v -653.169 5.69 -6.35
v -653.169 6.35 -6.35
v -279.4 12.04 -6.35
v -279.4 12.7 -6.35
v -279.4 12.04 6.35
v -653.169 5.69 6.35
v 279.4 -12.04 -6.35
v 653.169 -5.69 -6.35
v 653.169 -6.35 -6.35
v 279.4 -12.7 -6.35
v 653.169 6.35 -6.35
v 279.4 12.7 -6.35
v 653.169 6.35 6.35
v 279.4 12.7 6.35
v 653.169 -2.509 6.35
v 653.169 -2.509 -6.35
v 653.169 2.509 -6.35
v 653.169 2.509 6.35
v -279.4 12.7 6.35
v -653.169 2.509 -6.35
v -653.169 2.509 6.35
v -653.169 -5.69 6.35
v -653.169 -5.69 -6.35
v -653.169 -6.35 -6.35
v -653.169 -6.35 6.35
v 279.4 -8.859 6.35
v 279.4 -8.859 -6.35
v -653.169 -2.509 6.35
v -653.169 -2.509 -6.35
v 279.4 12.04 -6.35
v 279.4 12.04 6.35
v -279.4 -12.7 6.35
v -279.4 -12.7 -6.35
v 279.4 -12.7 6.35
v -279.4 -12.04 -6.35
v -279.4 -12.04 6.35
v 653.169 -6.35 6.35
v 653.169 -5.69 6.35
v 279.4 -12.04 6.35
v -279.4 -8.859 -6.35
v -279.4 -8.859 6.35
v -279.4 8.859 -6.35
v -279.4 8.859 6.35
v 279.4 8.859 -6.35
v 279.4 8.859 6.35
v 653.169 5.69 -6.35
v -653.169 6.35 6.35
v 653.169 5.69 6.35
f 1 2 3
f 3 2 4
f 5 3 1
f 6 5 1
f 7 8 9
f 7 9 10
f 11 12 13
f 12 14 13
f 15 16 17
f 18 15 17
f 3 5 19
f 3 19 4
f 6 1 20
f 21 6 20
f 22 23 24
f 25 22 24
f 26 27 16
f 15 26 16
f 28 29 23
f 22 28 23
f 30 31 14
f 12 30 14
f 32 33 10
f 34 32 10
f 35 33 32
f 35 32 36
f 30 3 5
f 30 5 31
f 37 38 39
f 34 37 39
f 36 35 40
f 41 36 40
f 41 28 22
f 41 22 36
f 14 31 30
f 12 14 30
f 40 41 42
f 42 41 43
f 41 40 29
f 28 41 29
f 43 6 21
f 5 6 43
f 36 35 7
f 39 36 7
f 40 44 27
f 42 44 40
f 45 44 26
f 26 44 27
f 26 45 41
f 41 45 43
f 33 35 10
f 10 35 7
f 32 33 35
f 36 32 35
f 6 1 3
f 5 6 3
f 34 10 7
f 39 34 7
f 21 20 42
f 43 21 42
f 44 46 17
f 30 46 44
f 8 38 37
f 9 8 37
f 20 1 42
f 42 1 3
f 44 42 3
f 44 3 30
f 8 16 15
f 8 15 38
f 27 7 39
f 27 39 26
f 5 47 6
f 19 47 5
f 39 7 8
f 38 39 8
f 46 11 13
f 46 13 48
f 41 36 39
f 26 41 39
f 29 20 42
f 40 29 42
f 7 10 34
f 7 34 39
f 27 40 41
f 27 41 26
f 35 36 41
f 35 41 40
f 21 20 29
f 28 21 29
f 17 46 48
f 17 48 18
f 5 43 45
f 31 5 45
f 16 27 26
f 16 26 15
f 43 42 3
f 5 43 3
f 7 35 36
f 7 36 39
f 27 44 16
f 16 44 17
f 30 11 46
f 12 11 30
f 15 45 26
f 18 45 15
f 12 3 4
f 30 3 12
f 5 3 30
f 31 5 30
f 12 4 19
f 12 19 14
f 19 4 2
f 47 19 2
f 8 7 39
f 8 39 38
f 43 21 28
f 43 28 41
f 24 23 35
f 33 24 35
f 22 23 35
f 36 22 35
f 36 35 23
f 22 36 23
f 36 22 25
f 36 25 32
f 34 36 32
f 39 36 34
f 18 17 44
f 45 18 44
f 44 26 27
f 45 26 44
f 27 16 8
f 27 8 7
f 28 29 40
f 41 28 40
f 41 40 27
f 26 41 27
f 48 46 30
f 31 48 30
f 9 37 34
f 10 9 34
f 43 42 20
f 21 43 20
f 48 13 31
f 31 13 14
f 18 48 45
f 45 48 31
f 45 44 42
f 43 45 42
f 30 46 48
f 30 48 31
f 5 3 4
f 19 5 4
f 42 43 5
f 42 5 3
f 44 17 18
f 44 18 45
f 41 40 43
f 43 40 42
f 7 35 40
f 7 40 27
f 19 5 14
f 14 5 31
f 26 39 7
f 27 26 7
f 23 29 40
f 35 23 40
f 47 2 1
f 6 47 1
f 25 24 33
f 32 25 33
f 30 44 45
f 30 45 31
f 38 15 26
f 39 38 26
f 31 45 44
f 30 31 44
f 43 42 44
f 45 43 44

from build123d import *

# Parameters (mm, degrees)
BOSS_EXTRUDE1_DEPTH      = 6.35
SPLIT1_SURFACE_1_1_BACK  = 1307.646
SPLIT1_SURFACE_1_1_DEPTH = 2615.292
SPLIT1_SURFACE_1_2_BACK  = 1307.646
SPLIT1_SURFACE_1_2_DEPTH = 2615.292
SPLIT1_SURFACE_2_3_BACK  = 1307.646
SPLIT1_SURFACE_2_3_DEPTH = 2615.292
SPLIT1_SURFACE_2_4_BACK  = 1307.646
SPLIT1_SURFACE_2_4_DEPTH = 2615.292
SPLIT1_SURFACE_4_5_BACK  = 1307.646
SPLIT1_SURFACE_4_5_DEPTH = 2615.292
SPLIT1_SURFACE_4_6_BACK  = 1307.646
SPLIT1_SURFACE_4_6_DEPTH = 2615.292
SPLIT1_SURFACE_5_7_BACK  = 1307.646
SPLIT1_SURFACE_5_7_DEPTH = 2615.292
SPLIT1_SURFACE_5_8_BACK  = 1307.646
SPLIT1_SURFACE_5_8_DEPTH = 2615.292
SPLIT2_START             = -653.16862
SPLIT2_OUTLINE_W         = 8.7
SPLIT2_OUTLINE_H         = 12.7
SPLIT2_DEPTH             = 932.56862
SPLIT2_START_2           = -6.35
SPLIT2_2_DEPTH           = 12.7
SPLIT2_START_3           = 12.039904759
SPLIT2_3_OUTLINE_W       = 558.8
SPLIT2_3_OUTLINE_H       = 12.7
SPLIT2_3_DEPTH           = 0.660095241
SPLIT2_4_OUTLINE_W       = 11.039904759
SPLIT2_4_OUTLINE_H       = 12.7
SPLIT2_4_DEPTH           = 932.56862
SPLIT2_5_DEPTH           = 12.7
SPLIT2_START_4           = 8.85944587
SPLIT2_6_OUTLINE_W       = 558.8
SPLIT2_6_OUTLINE_H       = 12.7
SPLIT2_6_DEPTH           = 3.180458889
SPLIT2_7_DEPTH           = 12.7
SPLIT2_8_DEPTH           = 12.7
SPLIT2_9_OUTLINE_W       = 20
SPLIT2_9_OUTLINE_H       = 12.7
SPLIT2_9_DEPTH           = 373.76862
SPLIT2_START_5           = 279.4
SPLIT2_10_OUTLINE_W      = 20
SPLIT2_10_OUTLINE_H      = 12.7
SPLIT2_10_DEPTH          = 373.76862
SPLIT2_11_OUTLINE_W      = 11.039904759
SPLIT2_11_OUTLINE_H      = 12.7
SPLIT2_11_DEPTH          = 932.56862
SPLIT2_12_DEPTH          = 12.7
SPLIT2_START_6           = -12.039904759
SPLIT2_13_OUTLINE_W      = 558.8
SPLIT2_13_OUTLINE_H      = 12.7
SPLIT2_13_DEPTH          = 3.180458889
SPLIT2_14_OUTLINE_W      = 8.7
SPLIT2_14_OUTLINE_H      = 12.7
SPLIT2_14_DEPTH          = 932.56862
SPLIT2_15_DEPTH          = 12.7
SPLIT2_16_OUTLINE_W      = 558.8
SPLIT2_16_OUTLINE_H      = 0.660095241
SPLIT2_16_DEPTH          = 12.7


# Read off the part's stored shape, not the designer's step: Split2
with BuildPart() as part:
    # Sketch1 → Boss-Extrude1 (new, symmetric)
    with BuildSketch(Plane.XY):
        Polygon((-653.16862, 6.35), (-653.16862, -6.35), (-279.4, -12.7), (0, -12.7), (0, 12.7), (-279.4, 12.7), align=None)
    boss_extrude1 = extrude(amount=BOSS_EXTRUDE1_DEPTH, both=True)

    # Mirror1: Boss-Extrude1 across Right Plane
    add(boss_extrude1.mirror(Plane(origin=(0, 0, 0), x_dir=(0, 0, -1), z_dir=(1, 0, 0))))


with BuildPart() as body_2:
    # Split1: the piece behind the surface
    add(part.part)
    # Split1 surface 1: a surface, the sketch's curves swept straight by 2615.292 mm
    with BuildLine(Plane.XY.offset(6.35).offset(-SPLIT1_SURFACE_1_1_BACK), mode=Mode.PRIVATE) as split1_surface_1_1_path:
        Line((653.16862, 5.689904759), (279.4, 12.039904759))
        Line((279.4, 12.039904759), (-279.4, 12.039904759))
        Line((-279.4, 12.039904759), (-653.16862, 5.689904759))
    split1_surface_1_1 = Shell.extrude(split1_surface_1_1_path.wire(), (0 * SPLIT1_SURFACE_1_1_DEPTH, 0 * SPLIT1_SURFACE_1_1_DEPTH, 1 * SPLIT1_SURFACE_1_1_DEPTH))
    split(bisect_by=split1_surface_1_1, keep=Keep.BOTTOM)

    # Split2 outline → Split2 (cut)
    with BuildSketch(Plane.YZ.offset(SPLIT2_START)):
        with Locations((8.35, 0)):
            Rectangle(SPLIT2_OUTLINE_W, SPLIT2_OUTLINE_H)
    extrude(amount=SPLIT2_DEPTH, mode=Mode.SUBTRACT)


with BuildPart() as part_1:
    add(part.part)

    # Split1: split by a surface, the side it looks to stays
    # Split1 surface 1: a surface, the sketch's curves swept straight by 2615.292 mm
    with BuildLine(Plane.XY.offset(6.35).offset(-SPLIT1_SURFACE_1_2_BACK), mode=Mode.PRIVATE) as split1_surface_1_2_path:
        Line((653.16862, 5.689904759), (279.4, 12.039904759))
        Line((279.4, 12.039904759), (-279.4, 12.039904759))
        Line((-279.4, 12.039904759), (-653.16862, 5.689904759))
    split1_surface_1_2 = Shell.extrude(split1_surface_1_2_path.wire(), (0 * SPLIT1_SURFACE_1_2_DEPTH, 0 * SPLIT1_SURFACE_1_2_DEPTH, 1 * SPLIT1_SURFACE_1_2_DEPTH))
    split(bisect_by=split1_surface_1_2, keep=Keep.TOP)


with BuildPart() as body_3:
    # Split1 2: the piece behind the surface
    add(part_1.part)
    # Split1 surface 2: a surface, the sketch's curves swept straight by 2615.292 mm
    with BuildLine(Plane.XY.offset(6.35).offset(-SPLIT1_SURFACE_2_3_BACK), mode=Mode.PRIVATE) as split1_surface_2_3_path:
        Line((653.16862, 2.50944587), (279.4, 8.85944587))
        Line((279.4, 8.85944587), (-279.4, 8.85944587))
        Line((-279.4, 8.85944587), (-653.16862, 2.50944587))
    split1_surface_2_3 = Shell.extrude(split1_surface_2_3_path.wire(), (0 * SPLIT1_SURFACE_2_3_DEPTH, 0 * SPLIT1_SURFACE_2_3_DEPTH, 1 * SPLIT1_SURFACE_2_3_DEPTH))
    split(bisect_by=split1_surface_2_3, keep=Keep.BOTTOM)

    # Split2 4 outline → Split2 4 (cut)
    with BuildSketch(Plane.YZ.offset(SPLIT2_START)):
        with Locations((6.51995238, 0)):
            Rectangle(SPLIT2_4_OUTLINE_W, SPLIT2_4_OUTLINE_H)
    extrude(amount=SPLIT2_4_DEPTH, mode=Mode.SUBTRACT)


with BuildPart() as part_2:
    add(part_1.part)

    # Split1 2: split by a surface, the side it looks to stays
    # Split1 surface 2: a surface, the sketch's curves swept straight by 2615.292 mm
    with BuildLine(Plane.XY.offset(6.35).offset(-SPLIT1_SURFACE_2_4_BACK), mode=Mode.PRIVATE) as split1_surface_2_4_path:
        Line((653.16862, 2.50944587), (279.4, 8.85944587))
        Line((279.4, 8.85944587), (-279.4, 8.85944587))
        Line((-279.4, 8.85944587), (-653.16862, 2.50944587))
    split1_surface_2_4 = Shell.extrude(split1_surface_2_4_path.wire(), (0 * SPLIT1_SURFACE_2_4_DEPTH, 0 * SPLIT1_SURFACE_2_4_DEPTH, 1 * SPLIT1_SURFACE_2_4_DEPTH))
    split(bisect_by=split1_surface_2_4, keep=Keep.TOP)


with BuildPart() as body_4_3:
    # Split1 4: the piece behind the surface
    add(part_2.part)
    # Split1 surface 4: a surface, the sketch's curves swept straight by 2615.292 mm
    with BuildLine(Plane.XY.offset(6.35).offset(-SPLIT1_SURFACE_4_5_BACK), mode=Mode.PRIVATE) as split1_surface_4_5_path:
        Line((-653.16862, -2.50944587), (-279.4, -8.85944587))
        Line((-279.4, -8.85944587), (279.4, -8.85944587))
        Line((279.4, -8.85944587), (653.16862, -2.50944587))
    split1_surface_4_5 = Shell.extrude(split1_surface_4_5_path.wire(), (0 * SPLIT1_SURFACE_4_5_DEPTH, 0 * SPLIT1_SURFACE_4_5_DEPTH, 1 * SPLIT1_SURFACE_4_5_DEPTH))
    split(bisect_by=split1_surface_4_5, keep=Keep.BOTTOM)


with BuildPart() as part_3:
    add(part_2.part)

    # Split1 4: split by a surface, the side it looks to stays
    # Split1 surface 4: a surface, the sketch's curves swept straight by 2615.292 mm
    with BuildLine(Plane.XY.offset(6.35).offset(-SPLIT1_SURFACE_4_6_BACK), mode=Mode.PRIVATE) as split1_surface_4_6_path:
        Line((-653.16862, -2.50944587), (-279.4, -8.85944587))
        Line((-279.4, -8.85944587), (279.4, -8.85944587))
        Line((279.4, -8.85944587), (653.16862, -2.50944587))
    split1_surface_4_6 = Shell.extrude(split1_surface_4_6_path.wire(), (0 * SPLIT1_SURFACE_4_6_DEPTH, 0 * SPLIT1_SURFACE_4_6_DEPTH, 1 * SPLIT1_SURFACE_4_6_DEPTH))
    split(bisect_by=split1_surface_4_6, keep=Keep.TOP)

    # Split2 9 outline → Split2 9 (cut)
    with BuildSketch(Plane.YZ.offset(SPLIT2_START)):
        Rectangle(SPLIT2_9_OUTLINE_W, SPLIT2_9_OUTLINE_H)
    extrude(amount=SPLIT2_9_DEPTH, mode=Mode.SUBTRACT)

    # Split2 10 outline → Split2 10 (cut)
    with BuildSketch(Plane.YZ.offset(SPLIT2_START_5)):
        Rectangle(SPLIT2_10_OUTLINE_W, SPLIT2_10_OUTLINE_H)
    extrude(amount=SPLIT2_10_DEPTH, mode=Mode.SUBTRACT)


with BuildPart() as body_5_2:
    # Split1 5 body 4 3: the piece behind the surface
    add(body_4_3.part)
    # Split1 surface 5: a surface, the sketch's curves swept straight by 2615.292 mm
    with BuildLine(Plane.XY.offset(6.35).offset(-SPLIT1_SURFACE_5_7_BACK), mode=Mode.PRIVATE) as split1_surface_5_7_path:
        Line((-653.16862, -5.689904759), (-279.4, -12.039904759))
        Line((-279.4, -12.039904759), (279.4, -12.039904759))
        Line((279.4, -12.039904759), (653.16862, -5.689904759))
    split1_surface_5_7 = Shell.extrude(split1_surface_5_7_path.wire(), (0 * SPLIT1_SURFACE_5_7_DEPTH, 0 * SPLIT1_SURFACE_5_7_DEPTH, 1 * SPLIT1_SURFACE_5_7_DEPTH))
    split(bisect_by=split1_surface_5_7, keep=Keep.BOTTOM)

    # Split2 14 outline → Split2 14 (cut)
    with BuildSketch(Plane.YZ.offset(SPLIT2_START)):
        with Locations((-8.35, 0)):
            Rectangle(SPLIT2_14_OUTLINE_W, SPLIT2_14_OUTLINE_H)
    extrude(amount=SPLIT2_14_DEPTH, mode=Mode.SUBTRACT)


with BuildPart() as body_4_3_1:
    add(body_4_3.part)

    # Split1 5 body 4 3: split by a surface, the side it looks to stays
    # Split1 surface 5: a surface, the sketch's curves swept straight by 2615.292 mm
    with BuildLine(Plane.XY.offset(6.35).offset(-SPLIT1_SURFACE_5_8_BACK), mode=Mode.PRIVATE) as split1_surface_5_8_path:
        Line((-653.16862, -5.689904759), (-279.4, -12.039904759))
        Line((-279.4, -12.039904759), (279.4, -12.039904759))
        Line((279.4, -12.039904759), (653.16862, -5.689904759))
    split1_surface_5_8 = Shell.extrude(split1_surface_5_8_path.wire(), (0 * SPLIT1_SURFACE_5_8_DEPTH, 0 * SPLIT1_SURFACE_5_8_DEPTH, 1 * SPLIT1_SURFACE_5_8_DEPTH))
    split(bisect_by=split1_surface_5_8, keep=Keep.TOP)

    # Split2 11 outline → Split2 11 (cut)
    with BuildSketch(Plane.YZ.offset(SPLIT2_START)):
        with Locations((-6.51995238, 0)):
            Rectangle(SPLIT2_11_OUTLINE_W, SPLIT2_11_OUTLINE_H)
    extrude(amount=SPLIT2_11_DEPTH, mode=Mode.SUBTRACT)


with BuildPart() as body_6_2:
    # Split2 2 outline → Split2 2 (new body)
    with BuildSketch(Plane.XY.offset(SPLIT2_START_2)):
        Polygon((-279.4, 12.039904759), (-279.4, 12.7), (-653.16862, 6.35), (-653.16862, 5.689904759), align=None)
    extrude(amount=SPLIT2_2_DEPTH)


with BuildPart() as body_7:
    # Split2 3 outline → Split2 3 (new body)
    with BuildSketch(Plane(origin=(0, 0, 0), x_dir=(1, 0, 0), z_dir=(0, 1, 0)).offset(SPLIT2_START_3)):
        Rectangle(SPLIT2_3_OUTLINE_W, SPLIT2_3_OUTLINE_H)
    extrude(amount=SPLIT2_3_DEPTH)


with BuildPart() as body_8:
    # Split2 5 outline → Split2 5 (new body)
    with BuildSketch(Plane.XY.offset(SPLIT2_START_2)):
        Polygon((-279.4, 8.85944587), (-279.4, 12.039904759), (-653.16862, 5.689904759), (-653.16862, 2.50944587), align=None)
    extrude(amount=SPLIT2_5_DEPTH)


with BuildPart() as body_9:
    # Split2 6 outline → Split2 6 (new body)
    with BuildSketch(Plane(origin=(0, 0, 0), x_dir=(1, 0, 0), z_dir=(0, 1, 0)).offset(SPLIT2_START_4)):
        Rectangle(SPLIT2_6_OUTLINE_W, SPLIT2_6_OUTLINE_H)
    extrude(amount=SPLIT2_6_DEPTH)


with BuildPart() as body_10:
    # Split2 7 outline → Split2 7 (new body)
    with BuildSketch(Plane.XY.offset(SPLIT2_START_2)):
        Polygon((653.16862, 2.50944587), (279.4, 8.85944587), (279.4, -8.85944587), (653.16862, -2.50944587), align=None)
    extrude(amount=SPLIT2_7_DEPTH)


with BuildPart() as body_11:
    # Split2 8 outline → Split2 8 (new body)
    with BuildSketch(Plane.XY.offset(SPLIT2_START_2)):
        Polygon((-279.4, -8.85944587), (-279.4, 8.85944587), (-653.16862, 2.50944587), (-653.16862, -2.50944587), align=None)
    extrude(amount=SPLIT2_8_DEPTH)


with BuildPart() as body_12:
    # Split2 12 outline → Split2 12 (new body)
    with BuildSketch(Plane.XY.offset(SPLIT2_START_2)):
        Polygon((-279.4, -12.039904759), (-279.4, -8.85944587), (-653.16862, -2.50944587), (-653.16862, -5.689904759), align=None)
    extrude(amount=SPLIT2_12_DEPTH)


with BuildPart() as body_13:
    # Split2 13 outline → Split2 13 (new body)
    with BuildSketch(Plane(origin=(0, 0, 0), x_dir=(1, 0, 0), z_dir=(0, 1, 0)).offset(SPLIT2_START_6)):
        Rectangle(SPLIT2_13_OUTLINE_W, SPLIT2_13_OUTLINE_H)
    extrude(amount=SPLIT2_13_DEPTH)


with BuildPart() as body_14:
    # Split2 15 outline → Split2 15 (new body)
    with BuildSketch(Plane.XY.offset(SPLIT2_START_2)):
        Polygon((-279.4, -12.7), (-279.4, -12.039904759), (-653.16862, -5.689904759), (-653.16862, -6.35), align=None)
    extrude(amount=SPLIT2_15_DEPTH)


with BuildPart() as body_15:
    # Split2 16 outline → Split2 16 (new body)
    with BuildSketch(Plane.XY.offset(SPLIT2_START_2)):
        with Locations((0, -12.36995238)):
            Rectangle(SPLIT2_16_OUTLINE_W, SPLIT2_16_OUTLINE_H)
    extrude(amount=SPLIT2_16_DEPTH)


solid = Compound([body_2.part, body_3.part, part_3.part, body_5_2.part, body_4_3_1.part, body_6_2.part, body_7.part, body_8.part, body_9.part, body_10.part, body_11.part, body_12.part, body_13.part, body_14.part, body_15.part])
